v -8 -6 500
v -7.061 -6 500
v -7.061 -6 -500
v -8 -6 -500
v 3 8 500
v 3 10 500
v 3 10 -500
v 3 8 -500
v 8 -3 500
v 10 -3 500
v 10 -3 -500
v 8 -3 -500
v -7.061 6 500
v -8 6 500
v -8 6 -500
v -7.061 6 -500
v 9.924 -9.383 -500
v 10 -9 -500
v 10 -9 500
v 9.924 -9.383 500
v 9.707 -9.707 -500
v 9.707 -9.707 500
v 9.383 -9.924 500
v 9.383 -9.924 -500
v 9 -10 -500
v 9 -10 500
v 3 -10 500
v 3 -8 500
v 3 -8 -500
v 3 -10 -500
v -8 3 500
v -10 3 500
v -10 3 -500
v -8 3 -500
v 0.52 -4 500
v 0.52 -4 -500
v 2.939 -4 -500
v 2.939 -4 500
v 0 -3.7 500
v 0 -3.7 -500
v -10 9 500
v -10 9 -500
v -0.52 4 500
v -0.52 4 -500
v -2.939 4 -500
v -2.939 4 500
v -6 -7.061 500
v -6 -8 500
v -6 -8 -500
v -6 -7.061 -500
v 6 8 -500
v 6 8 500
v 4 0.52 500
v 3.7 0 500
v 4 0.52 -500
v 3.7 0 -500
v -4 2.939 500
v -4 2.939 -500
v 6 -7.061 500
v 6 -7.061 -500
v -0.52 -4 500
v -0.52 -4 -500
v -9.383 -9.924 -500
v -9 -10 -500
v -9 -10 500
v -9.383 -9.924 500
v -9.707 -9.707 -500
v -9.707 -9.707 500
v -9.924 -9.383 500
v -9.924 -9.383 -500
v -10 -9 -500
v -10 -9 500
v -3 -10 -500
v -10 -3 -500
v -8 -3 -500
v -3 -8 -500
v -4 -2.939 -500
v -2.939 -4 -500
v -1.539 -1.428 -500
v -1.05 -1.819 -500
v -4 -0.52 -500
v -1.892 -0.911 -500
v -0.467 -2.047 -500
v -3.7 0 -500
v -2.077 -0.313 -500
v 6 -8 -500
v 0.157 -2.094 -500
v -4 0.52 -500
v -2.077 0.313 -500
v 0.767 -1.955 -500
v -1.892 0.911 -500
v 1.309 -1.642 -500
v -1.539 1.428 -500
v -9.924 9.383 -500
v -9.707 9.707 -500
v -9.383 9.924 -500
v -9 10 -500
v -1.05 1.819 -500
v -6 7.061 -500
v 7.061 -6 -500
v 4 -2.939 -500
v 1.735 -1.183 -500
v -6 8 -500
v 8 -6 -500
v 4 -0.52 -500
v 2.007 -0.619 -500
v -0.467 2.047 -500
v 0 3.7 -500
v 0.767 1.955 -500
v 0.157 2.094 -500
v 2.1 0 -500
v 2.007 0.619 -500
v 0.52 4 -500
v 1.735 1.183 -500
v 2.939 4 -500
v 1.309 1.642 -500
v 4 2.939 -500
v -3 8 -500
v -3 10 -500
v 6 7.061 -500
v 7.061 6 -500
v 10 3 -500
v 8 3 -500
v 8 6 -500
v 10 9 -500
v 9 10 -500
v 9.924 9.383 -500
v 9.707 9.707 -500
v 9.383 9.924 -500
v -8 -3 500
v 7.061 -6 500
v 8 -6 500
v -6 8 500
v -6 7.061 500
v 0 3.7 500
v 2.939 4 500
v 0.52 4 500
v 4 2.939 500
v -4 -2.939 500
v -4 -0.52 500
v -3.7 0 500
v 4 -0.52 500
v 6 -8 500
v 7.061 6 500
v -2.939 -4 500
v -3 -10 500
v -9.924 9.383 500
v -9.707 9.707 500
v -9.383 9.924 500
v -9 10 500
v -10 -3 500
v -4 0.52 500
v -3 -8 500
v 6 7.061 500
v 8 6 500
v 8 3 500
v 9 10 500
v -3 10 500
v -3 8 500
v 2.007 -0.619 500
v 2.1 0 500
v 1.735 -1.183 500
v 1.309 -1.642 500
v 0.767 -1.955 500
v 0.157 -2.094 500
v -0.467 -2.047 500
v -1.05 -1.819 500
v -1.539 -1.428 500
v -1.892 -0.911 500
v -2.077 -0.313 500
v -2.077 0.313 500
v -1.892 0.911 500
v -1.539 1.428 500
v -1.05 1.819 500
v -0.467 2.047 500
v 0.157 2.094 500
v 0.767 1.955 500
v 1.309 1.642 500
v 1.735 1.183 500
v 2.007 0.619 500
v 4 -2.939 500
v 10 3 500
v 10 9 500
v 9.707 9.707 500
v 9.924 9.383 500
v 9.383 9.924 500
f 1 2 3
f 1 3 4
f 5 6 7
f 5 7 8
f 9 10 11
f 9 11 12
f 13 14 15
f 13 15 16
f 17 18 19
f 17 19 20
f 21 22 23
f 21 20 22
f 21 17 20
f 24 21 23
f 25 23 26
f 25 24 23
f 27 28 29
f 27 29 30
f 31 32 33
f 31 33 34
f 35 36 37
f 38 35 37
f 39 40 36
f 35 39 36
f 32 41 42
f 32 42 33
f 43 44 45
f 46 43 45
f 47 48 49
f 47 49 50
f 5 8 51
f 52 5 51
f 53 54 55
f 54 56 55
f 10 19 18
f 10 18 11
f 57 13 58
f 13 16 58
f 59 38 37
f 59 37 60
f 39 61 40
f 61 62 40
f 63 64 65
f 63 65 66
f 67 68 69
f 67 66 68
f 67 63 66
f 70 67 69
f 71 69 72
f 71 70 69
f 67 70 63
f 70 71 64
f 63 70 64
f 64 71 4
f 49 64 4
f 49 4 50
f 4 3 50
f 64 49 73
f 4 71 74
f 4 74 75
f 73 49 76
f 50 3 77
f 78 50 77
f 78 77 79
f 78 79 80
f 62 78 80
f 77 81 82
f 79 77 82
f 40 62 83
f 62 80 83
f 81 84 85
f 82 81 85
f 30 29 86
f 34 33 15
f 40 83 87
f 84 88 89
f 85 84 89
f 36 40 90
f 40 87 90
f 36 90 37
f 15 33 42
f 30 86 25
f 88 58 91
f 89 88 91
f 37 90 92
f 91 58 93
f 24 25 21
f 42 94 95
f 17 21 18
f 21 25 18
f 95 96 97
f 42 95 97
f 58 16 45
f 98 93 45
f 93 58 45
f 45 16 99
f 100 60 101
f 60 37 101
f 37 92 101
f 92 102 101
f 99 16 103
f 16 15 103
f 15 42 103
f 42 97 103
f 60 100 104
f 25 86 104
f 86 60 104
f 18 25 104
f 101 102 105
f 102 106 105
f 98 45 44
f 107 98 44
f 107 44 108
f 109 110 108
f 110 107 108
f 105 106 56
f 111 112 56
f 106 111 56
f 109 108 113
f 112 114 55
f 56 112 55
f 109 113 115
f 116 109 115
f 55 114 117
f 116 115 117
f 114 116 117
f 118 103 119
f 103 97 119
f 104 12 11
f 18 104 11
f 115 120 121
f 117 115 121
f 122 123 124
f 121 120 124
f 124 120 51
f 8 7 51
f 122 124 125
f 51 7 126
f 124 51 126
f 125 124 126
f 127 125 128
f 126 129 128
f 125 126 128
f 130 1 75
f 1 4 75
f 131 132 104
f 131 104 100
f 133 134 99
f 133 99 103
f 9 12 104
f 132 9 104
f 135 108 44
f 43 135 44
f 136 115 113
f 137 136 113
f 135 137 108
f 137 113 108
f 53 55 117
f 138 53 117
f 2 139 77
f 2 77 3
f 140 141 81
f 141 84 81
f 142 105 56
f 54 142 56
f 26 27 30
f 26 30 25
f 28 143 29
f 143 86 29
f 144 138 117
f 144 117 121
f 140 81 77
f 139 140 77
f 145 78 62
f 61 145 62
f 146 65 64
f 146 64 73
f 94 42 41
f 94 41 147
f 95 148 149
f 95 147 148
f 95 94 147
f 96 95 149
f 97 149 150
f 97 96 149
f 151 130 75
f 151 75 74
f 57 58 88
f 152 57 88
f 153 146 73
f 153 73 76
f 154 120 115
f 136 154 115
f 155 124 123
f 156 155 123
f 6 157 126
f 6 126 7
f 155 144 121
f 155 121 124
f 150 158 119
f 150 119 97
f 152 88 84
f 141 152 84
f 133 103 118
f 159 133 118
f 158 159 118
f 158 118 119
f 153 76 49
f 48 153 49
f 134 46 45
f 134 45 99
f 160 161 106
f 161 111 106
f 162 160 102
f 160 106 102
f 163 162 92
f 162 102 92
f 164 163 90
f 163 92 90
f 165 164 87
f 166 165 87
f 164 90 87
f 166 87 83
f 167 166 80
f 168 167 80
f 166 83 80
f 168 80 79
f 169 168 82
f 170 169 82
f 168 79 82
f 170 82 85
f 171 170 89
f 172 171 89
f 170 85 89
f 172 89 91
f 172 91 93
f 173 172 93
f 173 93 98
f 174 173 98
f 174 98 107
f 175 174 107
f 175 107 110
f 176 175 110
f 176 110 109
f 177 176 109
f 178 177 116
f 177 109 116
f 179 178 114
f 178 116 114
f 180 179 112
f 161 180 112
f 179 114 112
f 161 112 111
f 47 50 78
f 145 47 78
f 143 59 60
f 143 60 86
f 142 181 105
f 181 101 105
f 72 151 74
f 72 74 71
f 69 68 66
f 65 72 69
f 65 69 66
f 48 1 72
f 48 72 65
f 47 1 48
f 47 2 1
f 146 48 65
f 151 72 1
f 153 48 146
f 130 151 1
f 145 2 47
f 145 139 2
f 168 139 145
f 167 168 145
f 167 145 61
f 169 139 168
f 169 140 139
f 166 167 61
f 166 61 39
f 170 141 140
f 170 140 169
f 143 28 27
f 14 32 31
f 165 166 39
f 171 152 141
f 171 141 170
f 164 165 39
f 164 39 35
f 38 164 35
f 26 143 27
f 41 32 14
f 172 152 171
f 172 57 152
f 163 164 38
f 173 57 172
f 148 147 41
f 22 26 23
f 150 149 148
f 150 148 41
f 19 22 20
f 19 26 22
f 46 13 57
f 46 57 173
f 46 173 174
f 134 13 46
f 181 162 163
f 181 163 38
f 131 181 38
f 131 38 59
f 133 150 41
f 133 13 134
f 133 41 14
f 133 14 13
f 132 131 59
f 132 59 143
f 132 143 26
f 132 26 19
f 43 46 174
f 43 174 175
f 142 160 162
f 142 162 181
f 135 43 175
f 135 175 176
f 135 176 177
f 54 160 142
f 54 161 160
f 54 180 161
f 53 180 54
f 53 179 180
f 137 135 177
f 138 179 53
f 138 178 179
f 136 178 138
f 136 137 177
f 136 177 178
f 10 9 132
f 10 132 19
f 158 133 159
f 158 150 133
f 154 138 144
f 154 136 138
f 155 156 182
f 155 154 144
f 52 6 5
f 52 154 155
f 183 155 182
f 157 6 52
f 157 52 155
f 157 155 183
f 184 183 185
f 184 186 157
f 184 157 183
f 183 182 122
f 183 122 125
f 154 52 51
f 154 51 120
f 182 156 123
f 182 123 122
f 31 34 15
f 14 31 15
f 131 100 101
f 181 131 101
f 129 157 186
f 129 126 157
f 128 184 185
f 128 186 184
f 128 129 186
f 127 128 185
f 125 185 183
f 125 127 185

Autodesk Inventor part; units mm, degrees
ref_plane "YZ Plane" through (0, 0, 0) normal (1, 0, 0) x (0, 1, 0)
ref_plane "XZ Plane" through (0, 0, 0) normal (0, 1, 0) x (-1, 0, 0)
ref_plane "XY Plane" through (0, 0, 0) normal (0, 0, 1) x (1, 0, 0)
sketch "Sketch1" plane through (0, 0, 0) normal (0, 0, 1) x (1, 0, 0)
  line L0 (-2.205, 0) -> (2.205, 0)
  line L1 (0, -2.205) -> (0, 2.205)
  arc A0 (9, -10) -> (10, -9) centre (9, -9) ccw
  line L2 (-10, 9) -> (-10, 3)
  line L3 (-10, 3) -> (-8, 3)
  line L4 (-8, 3) -> (-8, 6)
  line L5 (-8, 6) -> (-7.0607, 6)
  line L6 (-7.0607, 6) -> (-4, 2.9393)
  line L7 (-4, 2.9393) -> (-4, 0.5196)
  line L8 (-4, 0.5196) -> (-3.7, 0)
  line L9 (-3.7, 0) -> (-4, -0.5196)
  line L10 (-4, -0.5196) -> (-4, -2.9393)
  line L11 (-4, -2.9393) -> (-7.0607, -6)
  line L12 (-7.0607, -6) -> (-8, -6)
  line L13 (-8, -6) -> (-8, -3)
  line L14 (-8, -3) -> (-10, -3)
  line L15 (-10, -3) -> (-10, -9)
  arc A1 (-10, -9) -> (-9, -10) centre (-9, -9) ccw
  line L16 (-9, -10) -> (-3, -10)
  line L17 (-3, -10) -> (-3, -8)
  line L18 (-3, -8) -> (-6, -8)
  line L19 (-6, -7.0607) -> (-2.9393, -4)
  line L20 (-2.9393, -4) -> (-0.5196, -4)
  line L21 (-0.5196, -4) -> (0, -3.7)
  line L22 (0, -3.7) -> (0.5196, -4)
  line L23 (0.5196, -4) -> (2.9393, -4)
  line L24 (2.9393, -4) -> (6, -7.0607)
  line L25 (6, -7.0607) -> (6, -8)
  line L26 (6, -8) -> (3, -8)
  line L27 (3, -8) -> (3, -10)
  line L28 (3, -10) -> (9, -10)
  line L29 (10, -9) -> (10, -3)
  line L30 (10, -3) -> (8, -3)
  line L31 (8, -3) -> (8, -6)
  line L32 (8, -6) -> (7.0607, -6)
  line L33 (7.0607, -6) -> (4, -2.9393)
  line L34 (4, -2.9393) -> (4, -0.5196)
  line L35 (4, -0.5196) -> (3.7, 0)
  line L36 (3.7, 0) -> (4, 0.5196)
  line L37 (4, 0.5196) -> (4, 2.9393)
  line L38 (4, 2.9393) -> (7.0607, 6)
  line L39 (7.0607, 6) -> (8, 6)
  line L40 (8, 6) -> (8, 3)
  line L41 (8, 3) -> (10, 3)
  line L42 (10, 3) -> (10, 9)
  arc A2 (10, 9) -> (9, 10) centre (9, 9) ccw
  line L43 (9, 10) -> (3, 10)
  line L44 (3, 10) -> (3, 8)
  line L45 (3, 8) -> (6, 8)
  line L46 (6, 8) -> (6, 7.0607)
  line L47 (6, 7.0607) -> (2.9393, 4)
  line L48 (2.9393, 4) -> (0.5196, 4)
  line L49 (0.5196, 4) -> (0, 3.7)
  line L50 (0, 3.7) -> (-0.5196, 4)
  line L51 (-0.5196, 4) -> (-2.9393, 4)
  line L52 (-2.9393, 4) -> (-6, 7.0607)
  line L53 (-6, 7.0607) -> (-6, 8)
  line L54 (-6, 8) -> (-3, 8)
  line L55 (-3, 8) -> (-3, 10)
  line L56 (-3, 10) -> (-9, 10)
  arc A3 (-9, 10) -> (-10, 9) centre (-9, 9) ccw
  circle A4 centre (0, 0) radius 2.1
  line L57 (-6, -8) -> (-6, -7.0607)
extrude "Extrusion1" add sketch "Sketch1" along normal mid plane 1000
equation "\"d0\" = plateDepth"
equation "\"plateDepth\" = 1000"
equation "\"plateThickness\" = 6.35"
equation "\"supportPlateThickness\" = 6.35"
equation "\"separation\" = 35"
equation "\"centerVerticalRatio\" = 0.3"
properties part number "HFS5-2020" material "Aluminum 6061"
